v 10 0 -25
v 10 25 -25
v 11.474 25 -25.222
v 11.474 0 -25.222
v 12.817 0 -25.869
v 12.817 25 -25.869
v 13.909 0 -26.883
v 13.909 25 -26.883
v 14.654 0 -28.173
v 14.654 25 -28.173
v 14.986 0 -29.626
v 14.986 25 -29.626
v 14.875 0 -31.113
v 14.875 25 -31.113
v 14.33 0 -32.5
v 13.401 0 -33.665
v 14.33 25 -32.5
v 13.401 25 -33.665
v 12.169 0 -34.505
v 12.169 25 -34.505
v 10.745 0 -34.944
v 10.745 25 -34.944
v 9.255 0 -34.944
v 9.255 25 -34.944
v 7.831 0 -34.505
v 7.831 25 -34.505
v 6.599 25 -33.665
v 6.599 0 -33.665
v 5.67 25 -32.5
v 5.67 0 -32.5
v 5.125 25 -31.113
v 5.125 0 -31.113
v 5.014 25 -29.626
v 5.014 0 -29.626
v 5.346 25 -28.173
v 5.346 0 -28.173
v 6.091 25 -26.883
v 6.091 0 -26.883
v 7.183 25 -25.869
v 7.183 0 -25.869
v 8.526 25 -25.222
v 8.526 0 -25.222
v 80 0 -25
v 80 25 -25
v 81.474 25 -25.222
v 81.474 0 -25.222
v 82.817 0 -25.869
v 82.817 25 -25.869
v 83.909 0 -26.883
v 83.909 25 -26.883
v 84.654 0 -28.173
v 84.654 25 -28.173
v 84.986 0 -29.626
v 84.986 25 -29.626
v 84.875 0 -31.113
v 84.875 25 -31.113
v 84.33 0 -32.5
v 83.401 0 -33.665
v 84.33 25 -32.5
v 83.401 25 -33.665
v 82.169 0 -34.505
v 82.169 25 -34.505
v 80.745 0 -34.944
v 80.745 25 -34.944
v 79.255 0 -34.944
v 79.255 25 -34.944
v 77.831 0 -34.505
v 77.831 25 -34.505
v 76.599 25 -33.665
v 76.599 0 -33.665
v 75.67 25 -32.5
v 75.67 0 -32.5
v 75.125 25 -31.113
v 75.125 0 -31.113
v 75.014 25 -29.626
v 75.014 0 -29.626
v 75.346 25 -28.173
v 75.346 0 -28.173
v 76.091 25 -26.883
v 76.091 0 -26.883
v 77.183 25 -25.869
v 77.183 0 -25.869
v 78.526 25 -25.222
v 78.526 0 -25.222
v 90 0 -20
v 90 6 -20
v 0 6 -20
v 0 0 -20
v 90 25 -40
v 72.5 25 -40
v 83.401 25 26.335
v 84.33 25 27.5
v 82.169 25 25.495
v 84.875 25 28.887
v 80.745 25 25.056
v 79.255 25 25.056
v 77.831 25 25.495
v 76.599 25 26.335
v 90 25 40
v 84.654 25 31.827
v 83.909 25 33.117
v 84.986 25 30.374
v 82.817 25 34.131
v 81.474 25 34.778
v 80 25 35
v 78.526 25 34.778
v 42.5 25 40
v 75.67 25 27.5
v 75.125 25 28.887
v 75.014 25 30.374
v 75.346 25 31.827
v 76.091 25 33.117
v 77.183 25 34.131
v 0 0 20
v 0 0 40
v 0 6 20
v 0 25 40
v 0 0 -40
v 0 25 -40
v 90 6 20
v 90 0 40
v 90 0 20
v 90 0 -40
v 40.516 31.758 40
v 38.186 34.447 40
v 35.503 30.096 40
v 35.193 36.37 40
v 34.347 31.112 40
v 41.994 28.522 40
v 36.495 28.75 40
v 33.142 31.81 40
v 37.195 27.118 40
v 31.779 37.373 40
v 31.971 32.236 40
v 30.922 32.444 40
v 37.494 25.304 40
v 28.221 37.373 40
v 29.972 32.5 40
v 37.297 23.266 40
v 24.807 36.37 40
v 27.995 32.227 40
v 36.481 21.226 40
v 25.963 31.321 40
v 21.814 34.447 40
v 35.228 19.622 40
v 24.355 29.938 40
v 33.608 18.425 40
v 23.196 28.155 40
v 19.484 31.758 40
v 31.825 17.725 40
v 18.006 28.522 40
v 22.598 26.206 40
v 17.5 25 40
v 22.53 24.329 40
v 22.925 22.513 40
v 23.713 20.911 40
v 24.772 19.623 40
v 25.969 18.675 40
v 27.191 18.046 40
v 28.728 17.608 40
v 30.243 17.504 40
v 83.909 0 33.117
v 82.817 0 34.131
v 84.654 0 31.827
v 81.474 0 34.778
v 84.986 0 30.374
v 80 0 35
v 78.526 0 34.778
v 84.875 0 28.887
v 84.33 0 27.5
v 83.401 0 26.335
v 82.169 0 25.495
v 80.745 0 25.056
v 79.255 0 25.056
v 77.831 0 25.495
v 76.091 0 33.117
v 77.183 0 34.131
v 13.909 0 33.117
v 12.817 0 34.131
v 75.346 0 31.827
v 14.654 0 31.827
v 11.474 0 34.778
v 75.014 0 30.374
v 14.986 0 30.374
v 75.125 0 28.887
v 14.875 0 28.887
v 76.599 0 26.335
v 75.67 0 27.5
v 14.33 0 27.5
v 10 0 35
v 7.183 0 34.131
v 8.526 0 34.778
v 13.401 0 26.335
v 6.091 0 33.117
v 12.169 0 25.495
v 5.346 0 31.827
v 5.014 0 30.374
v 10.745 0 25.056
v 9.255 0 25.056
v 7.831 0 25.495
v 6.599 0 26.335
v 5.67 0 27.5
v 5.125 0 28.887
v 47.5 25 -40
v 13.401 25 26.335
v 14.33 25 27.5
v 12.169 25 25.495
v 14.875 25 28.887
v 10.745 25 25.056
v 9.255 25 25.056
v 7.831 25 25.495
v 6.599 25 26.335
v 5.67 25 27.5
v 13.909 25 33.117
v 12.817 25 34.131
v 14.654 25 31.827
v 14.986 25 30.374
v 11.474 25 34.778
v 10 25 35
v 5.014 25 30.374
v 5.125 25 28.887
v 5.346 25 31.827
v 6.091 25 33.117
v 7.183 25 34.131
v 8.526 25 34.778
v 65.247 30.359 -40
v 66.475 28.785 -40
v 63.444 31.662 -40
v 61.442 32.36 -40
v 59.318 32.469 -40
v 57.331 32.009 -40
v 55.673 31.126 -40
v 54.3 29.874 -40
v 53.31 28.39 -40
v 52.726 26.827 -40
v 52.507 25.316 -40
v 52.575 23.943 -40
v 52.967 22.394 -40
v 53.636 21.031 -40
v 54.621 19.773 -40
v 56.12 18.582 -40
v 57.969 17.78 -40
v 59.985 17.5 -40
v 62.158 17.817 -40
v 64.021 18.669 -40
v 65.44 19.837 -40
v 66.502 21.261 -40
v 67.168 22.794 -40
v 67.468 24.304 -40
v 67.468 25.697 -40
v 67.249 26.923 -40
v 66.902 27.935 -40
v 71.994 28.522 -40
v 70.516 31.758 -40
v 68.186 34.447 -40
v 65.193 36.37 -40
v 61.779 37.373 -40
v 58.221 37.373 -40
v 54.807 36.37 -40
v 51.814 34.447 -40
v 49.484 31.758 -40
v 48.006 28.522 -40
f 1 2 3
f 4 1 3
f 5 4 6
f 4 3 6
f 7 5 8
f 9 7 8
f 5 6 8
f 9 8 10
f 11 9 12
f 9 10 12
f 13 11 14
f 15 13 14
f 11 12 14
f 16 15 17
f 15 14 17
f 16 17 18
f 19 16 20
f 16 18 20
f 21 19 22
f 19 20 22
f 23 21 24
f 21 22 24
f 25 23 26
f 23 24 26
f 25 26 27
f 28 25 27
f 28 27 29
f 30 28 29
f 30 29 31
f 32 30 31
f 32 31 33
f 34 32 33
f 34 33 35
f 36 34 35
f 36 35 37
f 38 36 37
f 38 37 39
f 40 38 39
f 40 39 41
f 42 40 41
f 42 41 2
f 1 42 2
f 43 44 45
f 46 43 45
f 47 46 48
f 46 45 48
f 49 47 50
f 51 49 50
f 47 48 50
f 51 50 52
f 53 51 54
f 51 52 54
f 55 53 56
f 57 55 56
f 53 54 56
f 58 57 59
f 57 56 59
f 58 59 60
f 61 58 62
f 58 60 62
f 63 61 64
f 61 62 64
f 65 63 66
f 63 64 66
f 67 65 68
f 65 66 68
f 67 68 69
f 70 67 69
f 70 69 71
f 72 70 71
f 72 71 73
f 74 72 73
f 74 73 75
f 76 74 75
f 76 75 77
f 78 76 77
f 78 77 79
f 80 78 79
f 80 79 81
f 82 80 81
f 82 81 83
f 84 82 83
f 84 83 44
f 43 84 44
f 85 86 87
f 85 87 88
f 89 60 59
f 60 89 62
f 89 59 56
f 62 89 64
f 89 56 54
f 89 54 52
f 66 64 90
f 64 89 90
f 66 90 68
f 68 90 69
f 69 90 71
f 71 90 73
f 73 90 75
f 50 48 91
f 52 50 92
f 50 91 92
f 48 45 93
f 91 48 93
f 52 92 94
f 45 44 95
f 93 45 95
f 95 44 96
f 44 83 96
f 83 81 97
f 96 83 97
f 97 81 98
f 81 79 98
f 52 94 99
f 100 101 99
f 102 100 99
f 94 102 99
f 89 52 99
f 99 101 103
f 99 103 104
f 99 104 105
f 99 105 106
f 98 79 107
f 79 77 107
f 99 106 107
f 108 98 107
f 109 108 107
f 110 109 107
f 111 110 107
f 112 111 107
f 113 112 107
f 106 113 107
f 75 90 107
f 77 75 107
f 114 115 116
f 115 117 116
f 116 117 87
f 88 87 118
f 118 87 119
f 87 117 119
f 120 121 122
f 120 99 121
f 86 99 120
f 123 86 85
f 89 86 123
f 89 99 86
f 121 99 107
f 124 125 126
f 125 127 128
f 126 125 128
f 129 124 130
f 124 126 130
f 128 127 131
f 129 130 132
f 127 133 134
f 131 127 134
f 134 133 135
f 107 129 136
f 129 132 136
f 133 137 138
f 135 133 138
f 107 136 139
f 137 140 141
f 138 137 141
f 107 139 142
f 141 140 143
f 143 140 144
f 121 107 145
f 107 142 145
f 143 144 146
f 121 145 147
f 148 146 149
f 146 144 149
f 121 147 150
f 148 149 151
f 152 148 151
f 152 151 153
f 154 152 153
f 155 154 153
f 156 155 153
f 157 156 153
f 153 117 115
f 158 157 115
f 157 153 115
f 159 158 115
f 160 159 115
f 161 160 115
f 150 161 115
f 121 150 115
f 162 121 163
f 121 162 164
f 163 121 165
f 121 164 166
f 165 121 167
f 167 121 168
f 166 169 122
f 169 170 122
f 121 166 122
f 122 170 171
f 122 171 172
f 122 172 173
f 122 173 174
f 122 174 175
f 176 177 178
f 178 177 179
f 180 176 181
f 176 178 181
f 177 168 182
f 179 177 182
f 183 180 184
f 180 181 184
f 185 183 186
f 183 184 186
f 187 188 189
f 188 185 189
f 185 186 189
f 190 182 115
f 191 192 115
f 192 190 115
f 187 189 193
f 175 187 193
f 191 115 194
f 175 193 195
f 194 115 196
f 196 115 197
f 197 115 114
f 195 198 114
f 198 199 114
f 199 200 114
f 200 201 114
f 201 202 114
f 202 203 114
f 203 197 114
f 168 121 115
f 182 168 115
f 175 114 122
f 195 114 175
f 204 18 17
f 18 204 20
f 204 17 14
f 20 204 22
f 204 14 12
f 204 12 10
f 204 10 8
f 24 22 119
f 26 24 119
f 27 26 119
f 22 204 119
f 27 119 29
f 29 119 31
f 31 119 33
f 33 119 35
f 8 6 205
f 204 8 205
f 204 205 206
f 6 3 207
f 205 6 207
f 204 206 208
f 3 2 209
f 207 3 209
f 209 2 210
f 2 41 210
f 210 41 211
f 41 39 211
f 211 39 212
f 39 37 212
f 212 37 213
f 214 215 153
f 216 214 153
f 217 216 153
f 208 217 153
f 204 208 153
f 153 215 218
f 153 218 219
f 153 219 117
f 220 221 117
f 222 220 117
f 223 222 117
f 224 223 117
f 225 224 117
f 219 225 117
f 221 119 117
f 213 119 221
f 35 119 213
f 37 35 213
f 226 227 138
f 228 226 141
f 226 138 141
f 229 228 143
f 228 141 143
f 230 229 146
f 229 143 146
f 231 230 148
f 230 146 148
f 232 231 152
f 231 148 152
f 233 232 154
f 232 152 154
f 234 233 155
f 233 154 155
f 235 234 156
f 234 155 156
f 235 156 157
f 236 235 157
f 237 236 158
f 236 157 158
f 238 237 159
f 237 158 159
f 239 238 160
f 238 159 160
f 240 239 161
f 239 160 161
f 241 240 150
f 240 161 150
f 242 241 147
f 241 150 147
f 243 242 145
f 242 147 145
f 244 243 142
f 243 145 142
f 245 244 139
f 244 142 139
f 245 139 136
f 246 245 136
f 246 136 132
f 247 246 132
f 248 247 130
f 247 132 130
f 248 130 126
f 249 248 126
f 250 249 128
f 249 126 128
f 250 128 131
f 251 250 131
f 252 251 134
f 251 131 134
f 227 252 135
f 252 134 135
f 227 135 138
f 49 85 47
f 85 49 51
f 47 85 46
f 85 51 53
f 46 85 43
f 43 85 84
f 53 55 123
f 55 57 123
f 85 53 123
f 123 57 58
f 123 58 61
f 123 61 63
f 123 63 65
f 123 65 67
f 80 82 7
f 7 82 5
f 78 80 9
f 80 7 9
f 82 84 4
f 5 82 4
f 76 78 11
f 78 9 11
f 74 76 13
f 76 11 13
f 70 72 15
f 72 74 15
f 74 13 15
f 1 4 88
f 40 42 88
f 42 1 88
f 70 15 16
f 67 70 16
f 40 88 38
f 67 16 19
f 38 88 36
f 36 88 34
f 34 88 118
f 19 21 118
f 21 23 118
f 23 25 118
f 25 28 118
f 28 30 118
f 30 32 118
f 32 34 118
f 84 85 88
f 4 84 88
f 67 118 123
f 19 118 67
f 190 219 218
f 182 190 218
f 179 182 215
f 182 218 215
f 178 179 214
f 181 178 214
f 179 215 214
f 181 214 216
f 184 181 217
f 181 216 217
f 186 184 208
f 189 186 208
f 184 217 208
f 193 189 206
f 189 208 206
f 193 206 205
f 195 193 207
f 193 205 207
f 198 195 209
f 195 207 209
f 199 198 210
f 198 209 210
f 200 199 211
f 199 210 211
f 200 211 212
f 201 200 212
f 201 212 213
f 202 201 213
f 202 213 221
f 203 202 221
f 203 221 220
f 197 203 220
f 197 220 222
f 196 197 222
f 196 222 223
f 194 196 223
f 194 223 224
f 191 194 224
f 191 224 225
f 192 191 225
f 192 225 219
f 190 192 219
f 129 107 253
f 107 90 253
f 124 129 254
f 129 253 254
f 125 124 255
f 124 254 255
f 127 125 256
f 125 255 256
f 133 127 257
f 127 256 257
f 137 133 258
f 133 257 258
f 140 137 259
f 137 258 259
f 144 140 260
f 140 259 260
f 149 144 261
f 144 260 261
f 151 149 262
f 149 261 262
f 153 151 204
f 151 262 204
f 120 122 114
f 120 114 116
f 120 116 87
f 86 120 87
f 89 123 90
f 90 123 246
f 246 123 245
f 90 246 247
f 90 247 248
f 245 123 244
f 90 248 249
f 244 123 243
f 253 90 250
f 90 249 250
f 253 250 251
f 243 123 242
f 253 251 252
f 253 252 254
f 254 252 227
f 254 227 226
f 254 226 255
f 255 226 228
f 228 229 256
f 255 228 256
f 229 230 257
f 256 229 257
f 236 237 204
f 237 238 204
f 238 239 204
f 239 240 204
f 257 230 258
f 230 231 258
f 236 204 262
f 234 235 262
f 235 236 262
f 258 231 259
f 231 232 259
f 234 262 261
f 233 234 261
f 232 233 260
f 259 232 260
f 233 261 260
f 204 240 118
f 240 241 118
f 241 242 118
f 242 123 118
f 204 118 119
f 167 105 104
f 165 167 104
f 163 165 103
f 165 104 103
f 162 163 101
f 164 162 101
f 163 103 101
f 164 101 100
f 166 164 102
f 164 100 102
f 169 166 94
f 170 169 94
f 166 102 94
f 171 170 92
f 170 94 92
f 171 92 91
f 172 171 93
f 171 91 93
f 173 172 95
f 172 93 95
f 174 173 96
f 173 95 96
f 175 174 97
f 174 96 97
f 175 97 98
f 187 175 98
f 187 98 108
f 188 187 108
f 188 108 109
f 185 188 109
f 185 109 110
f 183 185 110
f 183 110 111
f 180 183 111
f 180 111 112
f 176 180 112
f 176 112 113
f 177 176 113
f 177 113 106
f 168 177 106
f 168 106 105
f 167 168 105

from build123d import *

# Parameters (mm, degrees)
SALIENTE_EXTRUIR1_DEPTH = 90
CORTAR_EXTRUIR1_REACH   = 103.612
CROQUIS2_R              = 5


with BuildPart() as part:
    # Croquis1 → Saliente-Extruir1 (new body)
    with BuildSketch(Plane(origin=(0, 0, 0), x_dir=(0, 0, -1), z_dir=(1, 0, 0))):
        Polygon((-40, 0), (-20, 0), (-20, 6), (20, 6), (20, 0), (40, 0), (40, 25), (-40, 25), align=None)
    extrude(amount=SALIENTE_EXTRUIR1_DEPTH)

    # Croquis2 → Cortar-Extruir1 (cut, up to next)
    with BuildSketch(Plane(origin=(0, 25, 0), x_dir=(1, 0, 0), z_dir=(0, 1, 0)), mode=Mode.PRIVATE) as cortar_extruir1_sk1:
        with Locations(Location((80, -30, 0), (0, 0, 270))):
            Circle(CROQUIS2_R)
    cortar_extruir1_tool1 = extrude(cortar_extruir1_sk1.sketch, amount=-CORTAR_EXTRUIR1_REACH, mode=Mode.PRIVATE) & part.part
    # Croquis2 → Cortar-Extruir1 (cut, up to next)
    with BuildSketch(Plane(origin=(0, 25, 0), x_dir=(1, 0, 0), z_dir=(0, 1, 0)), mode=Mode.PRIVATE) as cortar_extruir1_sk2:
        with Locations(Location((10, -30, 0), (0, 0, 270))):
            Circle(CROQUIS2_R)
    cortar_extruir1_tool2 = extrude(cortar_extruir1_sk2.sketch, amount=-CORTAR_EXTRUIR1_REACH, mode=Mode.PRIVATE) & part.part
    # Croquis2 → Cortar-Extruir1 (cut, up to next)
    with BuildSketch(Plane(origin=(0, 25, 0), x_dir=(1, 0, 0), z_dir=(0, 1, 0)), mode=Mode.PRIVATE) as cortar_extruir1_sk3:
        with Locations(Location((80, 30, 0), (0, 0, 270))):
            Circle(CROQUIS2_R)
    cortar_extruir1_tool3 = extrude(cortar_extruir1_sk3.sketch, amount=-CORTAR_EXTRUIR1_REACH, mode=Mode.PRIVATE) & part.part
    # Croquis2 → Cortar-Extruir1 (cut, up to next)
    with BuildSketch(Plane(origin=(0, 25, 0), x_dir=(1, 0, 0), z_dir=(0, 1, 0)), mode=Mode.PRIVATE) as cortar_extruir1_sk4:
        with Locations(Location((10, 30, 0), (0, 0, 270))):
            Circle(CROQUIS2_R)
    cortar_extruir1_tool4 = extrude(cortar_extruir1_sk4.sketch, amount=-CORTAR_EXTRUIR1_REACH, mode=Mode.PRIVATE) & part.part
    add(cortar_extruir1_tool1.solids().sort_by_distance((80, 25, 30))[0], mode=Mode.SUBTRACT)
    add(cortar_extruir1_tool2.solids().sort_by_distance((10, 25, 30))[0], mode=Mode.SUBTRACT)
    add(cortar_extruir1_tool3.solids().sort_by_distance((80, 25, -30))[0], mode=Mode.SUBTRACT)
    add(cortar_extruir1_tool4.solids().sort_by_distance((10, 25, -30))[0], mode=Mode.SUBTRACT)

    # Croquis4 → Recubrir4 section 0
    with BuildSketch(Plane.XY.offset(40)):
        with BuildLine():
            Line((17.5, 25), (42.5, 25))
            ThreePointArc((42.5, 25), (30, 37.5), (17.5, 25))
        make_face()
    # Croquis3 → Recubrir4 section 1
    with BuildSketch(Plane(origin=(0, 0, -40), x_dir=(-1, 0, 0), z_dir=(0, 0, -1))):
        with BuildLine():
            Line((-72.5, 25), (-47.5, 25))
            ThreePointArc((-47.5, 25), (-60, 37.5), (-72.5, 25))
        make_face()
    loft()

    # Cortar-Recubrir1: read off the stored shape, not the designer's step
    # Cortar-Recubrir1: loft between two sections, ruled curve by curve
    cortar_recubrir1_from = [
        Edge.make_bspline([(66.474673977, 28.785313314, -40), (66.159231201, 29.324869479, -40), (65.736792303, 29.896857571, -40), (64.865302784, 30.721785457, -40), (64.535116198, 30.990385277, -40), (63.787281531, 31.48910574, -40), (63.369421529, 31.719151625, -40), (62.447680858, 32.106958451, -40), (61.943610916, 32.26447662, -40), (60.867132061, 32.469827705, -40), (60.294709068, 32.517257966, -40), (59.119137062, 32.471285113, -40), (58.516285627, 32.377485336, -40), (57.333561907, 32.036960006, -40), (56.754242851, 31.790116754, -40), (55.675130521, 31.159231201, -40), (55.17584807, 30.775487545, -40), (54.298935855, 29.911880072, -40), (53.921474907, 29.432556086, -40), (53.304749619, 28.430691343, -40), (53.065285592, 27.908604481, -40), (52.716177882, 26.869807291, -40), (52.606176412, 26.353282213, -40), (52.491969247, 25.359825257, -40), (52.487459152, 24.882847533, -40), (52.555211917, 23.986528197, -40), (52.627305677, 23.567038585, -40), (52.918664408, 22.402946626, -40), (53.209883246, 21.754242851, -40), (53.840768799, 20.675130521, -40), (54.263207697, 20.103142429, -40), (55.134697216, 19.278214543, -40), (55.464883802, 19.009614723, -40), (56.212718469, 18.51089426, -40), (56.630578471, 18.280848375, -40), (57.552319142, 17.893041549, -40), (58.056389084, 17.73552338, -40), (59.132867939, 17.530172295, -40), (59.705290932, 17.482742034, -40), (60.880862938, 17.528714887, -40), (61.483714373, 17.622514664, -40), (62.666438093, 17.963039994, -40), (63.245757149, 18.209883246, -40), (64.324869479, 18.840768799, -40), (64.82415193, 19.224512455, -40), (65.701064145, 20.088119928, -40), (66.078525093, 20.567443914, -40), (66.695250381, 21.569308657, -40), (66.934714408, 22.091395519, -40), (67.283822118, 23.130192709, -40), (67.393823588, 23.646717787, -40), (67.508030753, 24.640174743, -40), (67.512540848, 25.117152467, -40), (67.444788083, 26.013471803, -40), (67.372694323, 26.432961415, -40), (67.081335592, 27.597053374, -40), (66.790116754, 28.245757149, -40), (66.474673977, 28.785313314, -40)], [0, 0, 0, 0, 0.0625, 0.0625, 0.09375, 0.09375, 0.125, 0.125, 0.15625, 0.15625, 0.1875, 0.1875, 0.21875, 0.21875, 0.25, 0.25, 0.28125, 0.28125, 0.3125, 0.3125, 0.34375, 0.34375, 0.375, 0.375, 0.40625, 0.40625, 0.4375, 0.4375, 0.5, 0.5, 0.5625, 0.5625, 0.59375, 0.59375, 0.625, 0.625, 0.65625, 0.65625, 0.6875, 0.6875, 0.71875, 0.71875, 0.75, 0.75, 0.78125, 0.78125, 0.8125, 0.8125, 0.84375, 0.84375, 0.875, 0.875, 0.90625, 0.90625, 0.9375, 0.9375, 1, 1, 1, 1], 3),
    ]
    cortar_recubrir1_to = [
        Edge.make_bspline([(29.971725733, 32.499946704, 40), (29.346730174, 32.497590515, 40), (28.640021711, 32.418925734, 40), (27.489296584, 32.078585195, 40), (27.091335491, 31.927601711, 40), (26.284847367, 31.530668849, 40), (25.876278751, 31.284498632, 40), (25.078546377, 30.681486974, 40), (24.689497752, 30.324360039, 40), (23.972030096, 29.495978512, 40), (23.643952375, 29.024509827, 40), (23.094236484, 27.984367777, 40), (22.873090724, 27.415752966, 40), (22.574631411, 26.22171991, 40), (22.497697107, 25.596721292, 40), (22.502409485, 24.346730174, 40), (22.584053936, 23.722329387, 40), (22.891507477, 22.53058058, 40), (23.116934166, 21.963649315, 40), (23.674476843, 20.927681551, 40), (24.006099995, 20.458699891, 40), (24.729793048, 19.635751438, 40), (25.121523263, 19.281567984, 40), (25.923779519, 18.684588169, 40), (26.334192585, 18.441505455, 40), (27.143650559, 18.050664595, 40), (27.542738719, 17.902685931, 40), (28.69599722, 17.571031246, 40), (29.403278708, 17.497697107, 40), (30.653269826, 17.502409485, 40), (31.359978289, 17.581074266, 40), (32.510703416, 17.921414805, 40), (32.908664509, 18.072398289, 40), (33.715152633, 18.469331151, 40), (34.123721249, 18.715501368, 40), (34.921453623, 19.318513026, 40), (35.310502248, 19.675639961, 40), (36.027969904, 20.504021488, 40), (36.356047625, 20.975490173, 40), (36.905763516, 22.015632223, 40), (37.126909276, 22.584247034, 40), (37.425368589, 23.77828009, 40), (37.502302893, 24.403278708, 40), (37.497590515, 25.653269826, 40), (37.415946064, 26.277670613, 40), (37.108492523, 27.46941942, 40), (36.883065834, 28.036350685, 40), (36.325523157, 29.072318449, 40), (35.993900005, 29.541300109, 40), (35.270206952, 30.364248562, 40), (34.878476737, 30.718432016, 40), (34.076220481, 31.315411831, 40), (33.665807415, 31.558494545, 40), (32.856349441, 31.949335405, 40), (32.457261281, 32.097314069, 40), (31.30400278, 32.428968754, 40), (30.596721292, 32.502302893, 40), (29.971725733, 32.499946704, 40)], [0, 0, 0, 0, 0.0625, 0.0625, 0.09375, 0.09375, 0.125, 0.125, 0.15625, 0.15625, 0.1875, 0.1875, 0.21875, 0.21875, 0.25, 0.25, 0.28125, 0.28125, 0.3125, 0.3125, 0.34375, 0.34375, 0.375, 0.375, 0.40625, 0.40625, 0.4375, 0.4375, 0.5, 0.5, 0.5625, 0.5625, 0.59375, 0.59375, 0.625, 0.625, 0.65625, 0.65625, 0.6875, 0.6875, 0.71875, 0.71875, 0.75, 0.75, 0.78125, 0.78125, 0.8125, 0.8125, 0.84375, 0.84375, 0.875, 0.875, 0.90625, 0.90625, 0.9375, 0.9375, 1, 1, 1, 1], 3),
    ]
    cortar_recubrir1 = Solid(Shell([*[Face.make_surface_from_curves(cortar_recubrir1_from[k], cortar_recubrir1_to[k]) for k in range(1)], Face(Wire(cortar_recubrir1_from)), Face(Wire(cortar_recubrir1_to))]))
    add(cortar_recubrir1, mode=Mode.SUBTRACT)


solid = part.part
